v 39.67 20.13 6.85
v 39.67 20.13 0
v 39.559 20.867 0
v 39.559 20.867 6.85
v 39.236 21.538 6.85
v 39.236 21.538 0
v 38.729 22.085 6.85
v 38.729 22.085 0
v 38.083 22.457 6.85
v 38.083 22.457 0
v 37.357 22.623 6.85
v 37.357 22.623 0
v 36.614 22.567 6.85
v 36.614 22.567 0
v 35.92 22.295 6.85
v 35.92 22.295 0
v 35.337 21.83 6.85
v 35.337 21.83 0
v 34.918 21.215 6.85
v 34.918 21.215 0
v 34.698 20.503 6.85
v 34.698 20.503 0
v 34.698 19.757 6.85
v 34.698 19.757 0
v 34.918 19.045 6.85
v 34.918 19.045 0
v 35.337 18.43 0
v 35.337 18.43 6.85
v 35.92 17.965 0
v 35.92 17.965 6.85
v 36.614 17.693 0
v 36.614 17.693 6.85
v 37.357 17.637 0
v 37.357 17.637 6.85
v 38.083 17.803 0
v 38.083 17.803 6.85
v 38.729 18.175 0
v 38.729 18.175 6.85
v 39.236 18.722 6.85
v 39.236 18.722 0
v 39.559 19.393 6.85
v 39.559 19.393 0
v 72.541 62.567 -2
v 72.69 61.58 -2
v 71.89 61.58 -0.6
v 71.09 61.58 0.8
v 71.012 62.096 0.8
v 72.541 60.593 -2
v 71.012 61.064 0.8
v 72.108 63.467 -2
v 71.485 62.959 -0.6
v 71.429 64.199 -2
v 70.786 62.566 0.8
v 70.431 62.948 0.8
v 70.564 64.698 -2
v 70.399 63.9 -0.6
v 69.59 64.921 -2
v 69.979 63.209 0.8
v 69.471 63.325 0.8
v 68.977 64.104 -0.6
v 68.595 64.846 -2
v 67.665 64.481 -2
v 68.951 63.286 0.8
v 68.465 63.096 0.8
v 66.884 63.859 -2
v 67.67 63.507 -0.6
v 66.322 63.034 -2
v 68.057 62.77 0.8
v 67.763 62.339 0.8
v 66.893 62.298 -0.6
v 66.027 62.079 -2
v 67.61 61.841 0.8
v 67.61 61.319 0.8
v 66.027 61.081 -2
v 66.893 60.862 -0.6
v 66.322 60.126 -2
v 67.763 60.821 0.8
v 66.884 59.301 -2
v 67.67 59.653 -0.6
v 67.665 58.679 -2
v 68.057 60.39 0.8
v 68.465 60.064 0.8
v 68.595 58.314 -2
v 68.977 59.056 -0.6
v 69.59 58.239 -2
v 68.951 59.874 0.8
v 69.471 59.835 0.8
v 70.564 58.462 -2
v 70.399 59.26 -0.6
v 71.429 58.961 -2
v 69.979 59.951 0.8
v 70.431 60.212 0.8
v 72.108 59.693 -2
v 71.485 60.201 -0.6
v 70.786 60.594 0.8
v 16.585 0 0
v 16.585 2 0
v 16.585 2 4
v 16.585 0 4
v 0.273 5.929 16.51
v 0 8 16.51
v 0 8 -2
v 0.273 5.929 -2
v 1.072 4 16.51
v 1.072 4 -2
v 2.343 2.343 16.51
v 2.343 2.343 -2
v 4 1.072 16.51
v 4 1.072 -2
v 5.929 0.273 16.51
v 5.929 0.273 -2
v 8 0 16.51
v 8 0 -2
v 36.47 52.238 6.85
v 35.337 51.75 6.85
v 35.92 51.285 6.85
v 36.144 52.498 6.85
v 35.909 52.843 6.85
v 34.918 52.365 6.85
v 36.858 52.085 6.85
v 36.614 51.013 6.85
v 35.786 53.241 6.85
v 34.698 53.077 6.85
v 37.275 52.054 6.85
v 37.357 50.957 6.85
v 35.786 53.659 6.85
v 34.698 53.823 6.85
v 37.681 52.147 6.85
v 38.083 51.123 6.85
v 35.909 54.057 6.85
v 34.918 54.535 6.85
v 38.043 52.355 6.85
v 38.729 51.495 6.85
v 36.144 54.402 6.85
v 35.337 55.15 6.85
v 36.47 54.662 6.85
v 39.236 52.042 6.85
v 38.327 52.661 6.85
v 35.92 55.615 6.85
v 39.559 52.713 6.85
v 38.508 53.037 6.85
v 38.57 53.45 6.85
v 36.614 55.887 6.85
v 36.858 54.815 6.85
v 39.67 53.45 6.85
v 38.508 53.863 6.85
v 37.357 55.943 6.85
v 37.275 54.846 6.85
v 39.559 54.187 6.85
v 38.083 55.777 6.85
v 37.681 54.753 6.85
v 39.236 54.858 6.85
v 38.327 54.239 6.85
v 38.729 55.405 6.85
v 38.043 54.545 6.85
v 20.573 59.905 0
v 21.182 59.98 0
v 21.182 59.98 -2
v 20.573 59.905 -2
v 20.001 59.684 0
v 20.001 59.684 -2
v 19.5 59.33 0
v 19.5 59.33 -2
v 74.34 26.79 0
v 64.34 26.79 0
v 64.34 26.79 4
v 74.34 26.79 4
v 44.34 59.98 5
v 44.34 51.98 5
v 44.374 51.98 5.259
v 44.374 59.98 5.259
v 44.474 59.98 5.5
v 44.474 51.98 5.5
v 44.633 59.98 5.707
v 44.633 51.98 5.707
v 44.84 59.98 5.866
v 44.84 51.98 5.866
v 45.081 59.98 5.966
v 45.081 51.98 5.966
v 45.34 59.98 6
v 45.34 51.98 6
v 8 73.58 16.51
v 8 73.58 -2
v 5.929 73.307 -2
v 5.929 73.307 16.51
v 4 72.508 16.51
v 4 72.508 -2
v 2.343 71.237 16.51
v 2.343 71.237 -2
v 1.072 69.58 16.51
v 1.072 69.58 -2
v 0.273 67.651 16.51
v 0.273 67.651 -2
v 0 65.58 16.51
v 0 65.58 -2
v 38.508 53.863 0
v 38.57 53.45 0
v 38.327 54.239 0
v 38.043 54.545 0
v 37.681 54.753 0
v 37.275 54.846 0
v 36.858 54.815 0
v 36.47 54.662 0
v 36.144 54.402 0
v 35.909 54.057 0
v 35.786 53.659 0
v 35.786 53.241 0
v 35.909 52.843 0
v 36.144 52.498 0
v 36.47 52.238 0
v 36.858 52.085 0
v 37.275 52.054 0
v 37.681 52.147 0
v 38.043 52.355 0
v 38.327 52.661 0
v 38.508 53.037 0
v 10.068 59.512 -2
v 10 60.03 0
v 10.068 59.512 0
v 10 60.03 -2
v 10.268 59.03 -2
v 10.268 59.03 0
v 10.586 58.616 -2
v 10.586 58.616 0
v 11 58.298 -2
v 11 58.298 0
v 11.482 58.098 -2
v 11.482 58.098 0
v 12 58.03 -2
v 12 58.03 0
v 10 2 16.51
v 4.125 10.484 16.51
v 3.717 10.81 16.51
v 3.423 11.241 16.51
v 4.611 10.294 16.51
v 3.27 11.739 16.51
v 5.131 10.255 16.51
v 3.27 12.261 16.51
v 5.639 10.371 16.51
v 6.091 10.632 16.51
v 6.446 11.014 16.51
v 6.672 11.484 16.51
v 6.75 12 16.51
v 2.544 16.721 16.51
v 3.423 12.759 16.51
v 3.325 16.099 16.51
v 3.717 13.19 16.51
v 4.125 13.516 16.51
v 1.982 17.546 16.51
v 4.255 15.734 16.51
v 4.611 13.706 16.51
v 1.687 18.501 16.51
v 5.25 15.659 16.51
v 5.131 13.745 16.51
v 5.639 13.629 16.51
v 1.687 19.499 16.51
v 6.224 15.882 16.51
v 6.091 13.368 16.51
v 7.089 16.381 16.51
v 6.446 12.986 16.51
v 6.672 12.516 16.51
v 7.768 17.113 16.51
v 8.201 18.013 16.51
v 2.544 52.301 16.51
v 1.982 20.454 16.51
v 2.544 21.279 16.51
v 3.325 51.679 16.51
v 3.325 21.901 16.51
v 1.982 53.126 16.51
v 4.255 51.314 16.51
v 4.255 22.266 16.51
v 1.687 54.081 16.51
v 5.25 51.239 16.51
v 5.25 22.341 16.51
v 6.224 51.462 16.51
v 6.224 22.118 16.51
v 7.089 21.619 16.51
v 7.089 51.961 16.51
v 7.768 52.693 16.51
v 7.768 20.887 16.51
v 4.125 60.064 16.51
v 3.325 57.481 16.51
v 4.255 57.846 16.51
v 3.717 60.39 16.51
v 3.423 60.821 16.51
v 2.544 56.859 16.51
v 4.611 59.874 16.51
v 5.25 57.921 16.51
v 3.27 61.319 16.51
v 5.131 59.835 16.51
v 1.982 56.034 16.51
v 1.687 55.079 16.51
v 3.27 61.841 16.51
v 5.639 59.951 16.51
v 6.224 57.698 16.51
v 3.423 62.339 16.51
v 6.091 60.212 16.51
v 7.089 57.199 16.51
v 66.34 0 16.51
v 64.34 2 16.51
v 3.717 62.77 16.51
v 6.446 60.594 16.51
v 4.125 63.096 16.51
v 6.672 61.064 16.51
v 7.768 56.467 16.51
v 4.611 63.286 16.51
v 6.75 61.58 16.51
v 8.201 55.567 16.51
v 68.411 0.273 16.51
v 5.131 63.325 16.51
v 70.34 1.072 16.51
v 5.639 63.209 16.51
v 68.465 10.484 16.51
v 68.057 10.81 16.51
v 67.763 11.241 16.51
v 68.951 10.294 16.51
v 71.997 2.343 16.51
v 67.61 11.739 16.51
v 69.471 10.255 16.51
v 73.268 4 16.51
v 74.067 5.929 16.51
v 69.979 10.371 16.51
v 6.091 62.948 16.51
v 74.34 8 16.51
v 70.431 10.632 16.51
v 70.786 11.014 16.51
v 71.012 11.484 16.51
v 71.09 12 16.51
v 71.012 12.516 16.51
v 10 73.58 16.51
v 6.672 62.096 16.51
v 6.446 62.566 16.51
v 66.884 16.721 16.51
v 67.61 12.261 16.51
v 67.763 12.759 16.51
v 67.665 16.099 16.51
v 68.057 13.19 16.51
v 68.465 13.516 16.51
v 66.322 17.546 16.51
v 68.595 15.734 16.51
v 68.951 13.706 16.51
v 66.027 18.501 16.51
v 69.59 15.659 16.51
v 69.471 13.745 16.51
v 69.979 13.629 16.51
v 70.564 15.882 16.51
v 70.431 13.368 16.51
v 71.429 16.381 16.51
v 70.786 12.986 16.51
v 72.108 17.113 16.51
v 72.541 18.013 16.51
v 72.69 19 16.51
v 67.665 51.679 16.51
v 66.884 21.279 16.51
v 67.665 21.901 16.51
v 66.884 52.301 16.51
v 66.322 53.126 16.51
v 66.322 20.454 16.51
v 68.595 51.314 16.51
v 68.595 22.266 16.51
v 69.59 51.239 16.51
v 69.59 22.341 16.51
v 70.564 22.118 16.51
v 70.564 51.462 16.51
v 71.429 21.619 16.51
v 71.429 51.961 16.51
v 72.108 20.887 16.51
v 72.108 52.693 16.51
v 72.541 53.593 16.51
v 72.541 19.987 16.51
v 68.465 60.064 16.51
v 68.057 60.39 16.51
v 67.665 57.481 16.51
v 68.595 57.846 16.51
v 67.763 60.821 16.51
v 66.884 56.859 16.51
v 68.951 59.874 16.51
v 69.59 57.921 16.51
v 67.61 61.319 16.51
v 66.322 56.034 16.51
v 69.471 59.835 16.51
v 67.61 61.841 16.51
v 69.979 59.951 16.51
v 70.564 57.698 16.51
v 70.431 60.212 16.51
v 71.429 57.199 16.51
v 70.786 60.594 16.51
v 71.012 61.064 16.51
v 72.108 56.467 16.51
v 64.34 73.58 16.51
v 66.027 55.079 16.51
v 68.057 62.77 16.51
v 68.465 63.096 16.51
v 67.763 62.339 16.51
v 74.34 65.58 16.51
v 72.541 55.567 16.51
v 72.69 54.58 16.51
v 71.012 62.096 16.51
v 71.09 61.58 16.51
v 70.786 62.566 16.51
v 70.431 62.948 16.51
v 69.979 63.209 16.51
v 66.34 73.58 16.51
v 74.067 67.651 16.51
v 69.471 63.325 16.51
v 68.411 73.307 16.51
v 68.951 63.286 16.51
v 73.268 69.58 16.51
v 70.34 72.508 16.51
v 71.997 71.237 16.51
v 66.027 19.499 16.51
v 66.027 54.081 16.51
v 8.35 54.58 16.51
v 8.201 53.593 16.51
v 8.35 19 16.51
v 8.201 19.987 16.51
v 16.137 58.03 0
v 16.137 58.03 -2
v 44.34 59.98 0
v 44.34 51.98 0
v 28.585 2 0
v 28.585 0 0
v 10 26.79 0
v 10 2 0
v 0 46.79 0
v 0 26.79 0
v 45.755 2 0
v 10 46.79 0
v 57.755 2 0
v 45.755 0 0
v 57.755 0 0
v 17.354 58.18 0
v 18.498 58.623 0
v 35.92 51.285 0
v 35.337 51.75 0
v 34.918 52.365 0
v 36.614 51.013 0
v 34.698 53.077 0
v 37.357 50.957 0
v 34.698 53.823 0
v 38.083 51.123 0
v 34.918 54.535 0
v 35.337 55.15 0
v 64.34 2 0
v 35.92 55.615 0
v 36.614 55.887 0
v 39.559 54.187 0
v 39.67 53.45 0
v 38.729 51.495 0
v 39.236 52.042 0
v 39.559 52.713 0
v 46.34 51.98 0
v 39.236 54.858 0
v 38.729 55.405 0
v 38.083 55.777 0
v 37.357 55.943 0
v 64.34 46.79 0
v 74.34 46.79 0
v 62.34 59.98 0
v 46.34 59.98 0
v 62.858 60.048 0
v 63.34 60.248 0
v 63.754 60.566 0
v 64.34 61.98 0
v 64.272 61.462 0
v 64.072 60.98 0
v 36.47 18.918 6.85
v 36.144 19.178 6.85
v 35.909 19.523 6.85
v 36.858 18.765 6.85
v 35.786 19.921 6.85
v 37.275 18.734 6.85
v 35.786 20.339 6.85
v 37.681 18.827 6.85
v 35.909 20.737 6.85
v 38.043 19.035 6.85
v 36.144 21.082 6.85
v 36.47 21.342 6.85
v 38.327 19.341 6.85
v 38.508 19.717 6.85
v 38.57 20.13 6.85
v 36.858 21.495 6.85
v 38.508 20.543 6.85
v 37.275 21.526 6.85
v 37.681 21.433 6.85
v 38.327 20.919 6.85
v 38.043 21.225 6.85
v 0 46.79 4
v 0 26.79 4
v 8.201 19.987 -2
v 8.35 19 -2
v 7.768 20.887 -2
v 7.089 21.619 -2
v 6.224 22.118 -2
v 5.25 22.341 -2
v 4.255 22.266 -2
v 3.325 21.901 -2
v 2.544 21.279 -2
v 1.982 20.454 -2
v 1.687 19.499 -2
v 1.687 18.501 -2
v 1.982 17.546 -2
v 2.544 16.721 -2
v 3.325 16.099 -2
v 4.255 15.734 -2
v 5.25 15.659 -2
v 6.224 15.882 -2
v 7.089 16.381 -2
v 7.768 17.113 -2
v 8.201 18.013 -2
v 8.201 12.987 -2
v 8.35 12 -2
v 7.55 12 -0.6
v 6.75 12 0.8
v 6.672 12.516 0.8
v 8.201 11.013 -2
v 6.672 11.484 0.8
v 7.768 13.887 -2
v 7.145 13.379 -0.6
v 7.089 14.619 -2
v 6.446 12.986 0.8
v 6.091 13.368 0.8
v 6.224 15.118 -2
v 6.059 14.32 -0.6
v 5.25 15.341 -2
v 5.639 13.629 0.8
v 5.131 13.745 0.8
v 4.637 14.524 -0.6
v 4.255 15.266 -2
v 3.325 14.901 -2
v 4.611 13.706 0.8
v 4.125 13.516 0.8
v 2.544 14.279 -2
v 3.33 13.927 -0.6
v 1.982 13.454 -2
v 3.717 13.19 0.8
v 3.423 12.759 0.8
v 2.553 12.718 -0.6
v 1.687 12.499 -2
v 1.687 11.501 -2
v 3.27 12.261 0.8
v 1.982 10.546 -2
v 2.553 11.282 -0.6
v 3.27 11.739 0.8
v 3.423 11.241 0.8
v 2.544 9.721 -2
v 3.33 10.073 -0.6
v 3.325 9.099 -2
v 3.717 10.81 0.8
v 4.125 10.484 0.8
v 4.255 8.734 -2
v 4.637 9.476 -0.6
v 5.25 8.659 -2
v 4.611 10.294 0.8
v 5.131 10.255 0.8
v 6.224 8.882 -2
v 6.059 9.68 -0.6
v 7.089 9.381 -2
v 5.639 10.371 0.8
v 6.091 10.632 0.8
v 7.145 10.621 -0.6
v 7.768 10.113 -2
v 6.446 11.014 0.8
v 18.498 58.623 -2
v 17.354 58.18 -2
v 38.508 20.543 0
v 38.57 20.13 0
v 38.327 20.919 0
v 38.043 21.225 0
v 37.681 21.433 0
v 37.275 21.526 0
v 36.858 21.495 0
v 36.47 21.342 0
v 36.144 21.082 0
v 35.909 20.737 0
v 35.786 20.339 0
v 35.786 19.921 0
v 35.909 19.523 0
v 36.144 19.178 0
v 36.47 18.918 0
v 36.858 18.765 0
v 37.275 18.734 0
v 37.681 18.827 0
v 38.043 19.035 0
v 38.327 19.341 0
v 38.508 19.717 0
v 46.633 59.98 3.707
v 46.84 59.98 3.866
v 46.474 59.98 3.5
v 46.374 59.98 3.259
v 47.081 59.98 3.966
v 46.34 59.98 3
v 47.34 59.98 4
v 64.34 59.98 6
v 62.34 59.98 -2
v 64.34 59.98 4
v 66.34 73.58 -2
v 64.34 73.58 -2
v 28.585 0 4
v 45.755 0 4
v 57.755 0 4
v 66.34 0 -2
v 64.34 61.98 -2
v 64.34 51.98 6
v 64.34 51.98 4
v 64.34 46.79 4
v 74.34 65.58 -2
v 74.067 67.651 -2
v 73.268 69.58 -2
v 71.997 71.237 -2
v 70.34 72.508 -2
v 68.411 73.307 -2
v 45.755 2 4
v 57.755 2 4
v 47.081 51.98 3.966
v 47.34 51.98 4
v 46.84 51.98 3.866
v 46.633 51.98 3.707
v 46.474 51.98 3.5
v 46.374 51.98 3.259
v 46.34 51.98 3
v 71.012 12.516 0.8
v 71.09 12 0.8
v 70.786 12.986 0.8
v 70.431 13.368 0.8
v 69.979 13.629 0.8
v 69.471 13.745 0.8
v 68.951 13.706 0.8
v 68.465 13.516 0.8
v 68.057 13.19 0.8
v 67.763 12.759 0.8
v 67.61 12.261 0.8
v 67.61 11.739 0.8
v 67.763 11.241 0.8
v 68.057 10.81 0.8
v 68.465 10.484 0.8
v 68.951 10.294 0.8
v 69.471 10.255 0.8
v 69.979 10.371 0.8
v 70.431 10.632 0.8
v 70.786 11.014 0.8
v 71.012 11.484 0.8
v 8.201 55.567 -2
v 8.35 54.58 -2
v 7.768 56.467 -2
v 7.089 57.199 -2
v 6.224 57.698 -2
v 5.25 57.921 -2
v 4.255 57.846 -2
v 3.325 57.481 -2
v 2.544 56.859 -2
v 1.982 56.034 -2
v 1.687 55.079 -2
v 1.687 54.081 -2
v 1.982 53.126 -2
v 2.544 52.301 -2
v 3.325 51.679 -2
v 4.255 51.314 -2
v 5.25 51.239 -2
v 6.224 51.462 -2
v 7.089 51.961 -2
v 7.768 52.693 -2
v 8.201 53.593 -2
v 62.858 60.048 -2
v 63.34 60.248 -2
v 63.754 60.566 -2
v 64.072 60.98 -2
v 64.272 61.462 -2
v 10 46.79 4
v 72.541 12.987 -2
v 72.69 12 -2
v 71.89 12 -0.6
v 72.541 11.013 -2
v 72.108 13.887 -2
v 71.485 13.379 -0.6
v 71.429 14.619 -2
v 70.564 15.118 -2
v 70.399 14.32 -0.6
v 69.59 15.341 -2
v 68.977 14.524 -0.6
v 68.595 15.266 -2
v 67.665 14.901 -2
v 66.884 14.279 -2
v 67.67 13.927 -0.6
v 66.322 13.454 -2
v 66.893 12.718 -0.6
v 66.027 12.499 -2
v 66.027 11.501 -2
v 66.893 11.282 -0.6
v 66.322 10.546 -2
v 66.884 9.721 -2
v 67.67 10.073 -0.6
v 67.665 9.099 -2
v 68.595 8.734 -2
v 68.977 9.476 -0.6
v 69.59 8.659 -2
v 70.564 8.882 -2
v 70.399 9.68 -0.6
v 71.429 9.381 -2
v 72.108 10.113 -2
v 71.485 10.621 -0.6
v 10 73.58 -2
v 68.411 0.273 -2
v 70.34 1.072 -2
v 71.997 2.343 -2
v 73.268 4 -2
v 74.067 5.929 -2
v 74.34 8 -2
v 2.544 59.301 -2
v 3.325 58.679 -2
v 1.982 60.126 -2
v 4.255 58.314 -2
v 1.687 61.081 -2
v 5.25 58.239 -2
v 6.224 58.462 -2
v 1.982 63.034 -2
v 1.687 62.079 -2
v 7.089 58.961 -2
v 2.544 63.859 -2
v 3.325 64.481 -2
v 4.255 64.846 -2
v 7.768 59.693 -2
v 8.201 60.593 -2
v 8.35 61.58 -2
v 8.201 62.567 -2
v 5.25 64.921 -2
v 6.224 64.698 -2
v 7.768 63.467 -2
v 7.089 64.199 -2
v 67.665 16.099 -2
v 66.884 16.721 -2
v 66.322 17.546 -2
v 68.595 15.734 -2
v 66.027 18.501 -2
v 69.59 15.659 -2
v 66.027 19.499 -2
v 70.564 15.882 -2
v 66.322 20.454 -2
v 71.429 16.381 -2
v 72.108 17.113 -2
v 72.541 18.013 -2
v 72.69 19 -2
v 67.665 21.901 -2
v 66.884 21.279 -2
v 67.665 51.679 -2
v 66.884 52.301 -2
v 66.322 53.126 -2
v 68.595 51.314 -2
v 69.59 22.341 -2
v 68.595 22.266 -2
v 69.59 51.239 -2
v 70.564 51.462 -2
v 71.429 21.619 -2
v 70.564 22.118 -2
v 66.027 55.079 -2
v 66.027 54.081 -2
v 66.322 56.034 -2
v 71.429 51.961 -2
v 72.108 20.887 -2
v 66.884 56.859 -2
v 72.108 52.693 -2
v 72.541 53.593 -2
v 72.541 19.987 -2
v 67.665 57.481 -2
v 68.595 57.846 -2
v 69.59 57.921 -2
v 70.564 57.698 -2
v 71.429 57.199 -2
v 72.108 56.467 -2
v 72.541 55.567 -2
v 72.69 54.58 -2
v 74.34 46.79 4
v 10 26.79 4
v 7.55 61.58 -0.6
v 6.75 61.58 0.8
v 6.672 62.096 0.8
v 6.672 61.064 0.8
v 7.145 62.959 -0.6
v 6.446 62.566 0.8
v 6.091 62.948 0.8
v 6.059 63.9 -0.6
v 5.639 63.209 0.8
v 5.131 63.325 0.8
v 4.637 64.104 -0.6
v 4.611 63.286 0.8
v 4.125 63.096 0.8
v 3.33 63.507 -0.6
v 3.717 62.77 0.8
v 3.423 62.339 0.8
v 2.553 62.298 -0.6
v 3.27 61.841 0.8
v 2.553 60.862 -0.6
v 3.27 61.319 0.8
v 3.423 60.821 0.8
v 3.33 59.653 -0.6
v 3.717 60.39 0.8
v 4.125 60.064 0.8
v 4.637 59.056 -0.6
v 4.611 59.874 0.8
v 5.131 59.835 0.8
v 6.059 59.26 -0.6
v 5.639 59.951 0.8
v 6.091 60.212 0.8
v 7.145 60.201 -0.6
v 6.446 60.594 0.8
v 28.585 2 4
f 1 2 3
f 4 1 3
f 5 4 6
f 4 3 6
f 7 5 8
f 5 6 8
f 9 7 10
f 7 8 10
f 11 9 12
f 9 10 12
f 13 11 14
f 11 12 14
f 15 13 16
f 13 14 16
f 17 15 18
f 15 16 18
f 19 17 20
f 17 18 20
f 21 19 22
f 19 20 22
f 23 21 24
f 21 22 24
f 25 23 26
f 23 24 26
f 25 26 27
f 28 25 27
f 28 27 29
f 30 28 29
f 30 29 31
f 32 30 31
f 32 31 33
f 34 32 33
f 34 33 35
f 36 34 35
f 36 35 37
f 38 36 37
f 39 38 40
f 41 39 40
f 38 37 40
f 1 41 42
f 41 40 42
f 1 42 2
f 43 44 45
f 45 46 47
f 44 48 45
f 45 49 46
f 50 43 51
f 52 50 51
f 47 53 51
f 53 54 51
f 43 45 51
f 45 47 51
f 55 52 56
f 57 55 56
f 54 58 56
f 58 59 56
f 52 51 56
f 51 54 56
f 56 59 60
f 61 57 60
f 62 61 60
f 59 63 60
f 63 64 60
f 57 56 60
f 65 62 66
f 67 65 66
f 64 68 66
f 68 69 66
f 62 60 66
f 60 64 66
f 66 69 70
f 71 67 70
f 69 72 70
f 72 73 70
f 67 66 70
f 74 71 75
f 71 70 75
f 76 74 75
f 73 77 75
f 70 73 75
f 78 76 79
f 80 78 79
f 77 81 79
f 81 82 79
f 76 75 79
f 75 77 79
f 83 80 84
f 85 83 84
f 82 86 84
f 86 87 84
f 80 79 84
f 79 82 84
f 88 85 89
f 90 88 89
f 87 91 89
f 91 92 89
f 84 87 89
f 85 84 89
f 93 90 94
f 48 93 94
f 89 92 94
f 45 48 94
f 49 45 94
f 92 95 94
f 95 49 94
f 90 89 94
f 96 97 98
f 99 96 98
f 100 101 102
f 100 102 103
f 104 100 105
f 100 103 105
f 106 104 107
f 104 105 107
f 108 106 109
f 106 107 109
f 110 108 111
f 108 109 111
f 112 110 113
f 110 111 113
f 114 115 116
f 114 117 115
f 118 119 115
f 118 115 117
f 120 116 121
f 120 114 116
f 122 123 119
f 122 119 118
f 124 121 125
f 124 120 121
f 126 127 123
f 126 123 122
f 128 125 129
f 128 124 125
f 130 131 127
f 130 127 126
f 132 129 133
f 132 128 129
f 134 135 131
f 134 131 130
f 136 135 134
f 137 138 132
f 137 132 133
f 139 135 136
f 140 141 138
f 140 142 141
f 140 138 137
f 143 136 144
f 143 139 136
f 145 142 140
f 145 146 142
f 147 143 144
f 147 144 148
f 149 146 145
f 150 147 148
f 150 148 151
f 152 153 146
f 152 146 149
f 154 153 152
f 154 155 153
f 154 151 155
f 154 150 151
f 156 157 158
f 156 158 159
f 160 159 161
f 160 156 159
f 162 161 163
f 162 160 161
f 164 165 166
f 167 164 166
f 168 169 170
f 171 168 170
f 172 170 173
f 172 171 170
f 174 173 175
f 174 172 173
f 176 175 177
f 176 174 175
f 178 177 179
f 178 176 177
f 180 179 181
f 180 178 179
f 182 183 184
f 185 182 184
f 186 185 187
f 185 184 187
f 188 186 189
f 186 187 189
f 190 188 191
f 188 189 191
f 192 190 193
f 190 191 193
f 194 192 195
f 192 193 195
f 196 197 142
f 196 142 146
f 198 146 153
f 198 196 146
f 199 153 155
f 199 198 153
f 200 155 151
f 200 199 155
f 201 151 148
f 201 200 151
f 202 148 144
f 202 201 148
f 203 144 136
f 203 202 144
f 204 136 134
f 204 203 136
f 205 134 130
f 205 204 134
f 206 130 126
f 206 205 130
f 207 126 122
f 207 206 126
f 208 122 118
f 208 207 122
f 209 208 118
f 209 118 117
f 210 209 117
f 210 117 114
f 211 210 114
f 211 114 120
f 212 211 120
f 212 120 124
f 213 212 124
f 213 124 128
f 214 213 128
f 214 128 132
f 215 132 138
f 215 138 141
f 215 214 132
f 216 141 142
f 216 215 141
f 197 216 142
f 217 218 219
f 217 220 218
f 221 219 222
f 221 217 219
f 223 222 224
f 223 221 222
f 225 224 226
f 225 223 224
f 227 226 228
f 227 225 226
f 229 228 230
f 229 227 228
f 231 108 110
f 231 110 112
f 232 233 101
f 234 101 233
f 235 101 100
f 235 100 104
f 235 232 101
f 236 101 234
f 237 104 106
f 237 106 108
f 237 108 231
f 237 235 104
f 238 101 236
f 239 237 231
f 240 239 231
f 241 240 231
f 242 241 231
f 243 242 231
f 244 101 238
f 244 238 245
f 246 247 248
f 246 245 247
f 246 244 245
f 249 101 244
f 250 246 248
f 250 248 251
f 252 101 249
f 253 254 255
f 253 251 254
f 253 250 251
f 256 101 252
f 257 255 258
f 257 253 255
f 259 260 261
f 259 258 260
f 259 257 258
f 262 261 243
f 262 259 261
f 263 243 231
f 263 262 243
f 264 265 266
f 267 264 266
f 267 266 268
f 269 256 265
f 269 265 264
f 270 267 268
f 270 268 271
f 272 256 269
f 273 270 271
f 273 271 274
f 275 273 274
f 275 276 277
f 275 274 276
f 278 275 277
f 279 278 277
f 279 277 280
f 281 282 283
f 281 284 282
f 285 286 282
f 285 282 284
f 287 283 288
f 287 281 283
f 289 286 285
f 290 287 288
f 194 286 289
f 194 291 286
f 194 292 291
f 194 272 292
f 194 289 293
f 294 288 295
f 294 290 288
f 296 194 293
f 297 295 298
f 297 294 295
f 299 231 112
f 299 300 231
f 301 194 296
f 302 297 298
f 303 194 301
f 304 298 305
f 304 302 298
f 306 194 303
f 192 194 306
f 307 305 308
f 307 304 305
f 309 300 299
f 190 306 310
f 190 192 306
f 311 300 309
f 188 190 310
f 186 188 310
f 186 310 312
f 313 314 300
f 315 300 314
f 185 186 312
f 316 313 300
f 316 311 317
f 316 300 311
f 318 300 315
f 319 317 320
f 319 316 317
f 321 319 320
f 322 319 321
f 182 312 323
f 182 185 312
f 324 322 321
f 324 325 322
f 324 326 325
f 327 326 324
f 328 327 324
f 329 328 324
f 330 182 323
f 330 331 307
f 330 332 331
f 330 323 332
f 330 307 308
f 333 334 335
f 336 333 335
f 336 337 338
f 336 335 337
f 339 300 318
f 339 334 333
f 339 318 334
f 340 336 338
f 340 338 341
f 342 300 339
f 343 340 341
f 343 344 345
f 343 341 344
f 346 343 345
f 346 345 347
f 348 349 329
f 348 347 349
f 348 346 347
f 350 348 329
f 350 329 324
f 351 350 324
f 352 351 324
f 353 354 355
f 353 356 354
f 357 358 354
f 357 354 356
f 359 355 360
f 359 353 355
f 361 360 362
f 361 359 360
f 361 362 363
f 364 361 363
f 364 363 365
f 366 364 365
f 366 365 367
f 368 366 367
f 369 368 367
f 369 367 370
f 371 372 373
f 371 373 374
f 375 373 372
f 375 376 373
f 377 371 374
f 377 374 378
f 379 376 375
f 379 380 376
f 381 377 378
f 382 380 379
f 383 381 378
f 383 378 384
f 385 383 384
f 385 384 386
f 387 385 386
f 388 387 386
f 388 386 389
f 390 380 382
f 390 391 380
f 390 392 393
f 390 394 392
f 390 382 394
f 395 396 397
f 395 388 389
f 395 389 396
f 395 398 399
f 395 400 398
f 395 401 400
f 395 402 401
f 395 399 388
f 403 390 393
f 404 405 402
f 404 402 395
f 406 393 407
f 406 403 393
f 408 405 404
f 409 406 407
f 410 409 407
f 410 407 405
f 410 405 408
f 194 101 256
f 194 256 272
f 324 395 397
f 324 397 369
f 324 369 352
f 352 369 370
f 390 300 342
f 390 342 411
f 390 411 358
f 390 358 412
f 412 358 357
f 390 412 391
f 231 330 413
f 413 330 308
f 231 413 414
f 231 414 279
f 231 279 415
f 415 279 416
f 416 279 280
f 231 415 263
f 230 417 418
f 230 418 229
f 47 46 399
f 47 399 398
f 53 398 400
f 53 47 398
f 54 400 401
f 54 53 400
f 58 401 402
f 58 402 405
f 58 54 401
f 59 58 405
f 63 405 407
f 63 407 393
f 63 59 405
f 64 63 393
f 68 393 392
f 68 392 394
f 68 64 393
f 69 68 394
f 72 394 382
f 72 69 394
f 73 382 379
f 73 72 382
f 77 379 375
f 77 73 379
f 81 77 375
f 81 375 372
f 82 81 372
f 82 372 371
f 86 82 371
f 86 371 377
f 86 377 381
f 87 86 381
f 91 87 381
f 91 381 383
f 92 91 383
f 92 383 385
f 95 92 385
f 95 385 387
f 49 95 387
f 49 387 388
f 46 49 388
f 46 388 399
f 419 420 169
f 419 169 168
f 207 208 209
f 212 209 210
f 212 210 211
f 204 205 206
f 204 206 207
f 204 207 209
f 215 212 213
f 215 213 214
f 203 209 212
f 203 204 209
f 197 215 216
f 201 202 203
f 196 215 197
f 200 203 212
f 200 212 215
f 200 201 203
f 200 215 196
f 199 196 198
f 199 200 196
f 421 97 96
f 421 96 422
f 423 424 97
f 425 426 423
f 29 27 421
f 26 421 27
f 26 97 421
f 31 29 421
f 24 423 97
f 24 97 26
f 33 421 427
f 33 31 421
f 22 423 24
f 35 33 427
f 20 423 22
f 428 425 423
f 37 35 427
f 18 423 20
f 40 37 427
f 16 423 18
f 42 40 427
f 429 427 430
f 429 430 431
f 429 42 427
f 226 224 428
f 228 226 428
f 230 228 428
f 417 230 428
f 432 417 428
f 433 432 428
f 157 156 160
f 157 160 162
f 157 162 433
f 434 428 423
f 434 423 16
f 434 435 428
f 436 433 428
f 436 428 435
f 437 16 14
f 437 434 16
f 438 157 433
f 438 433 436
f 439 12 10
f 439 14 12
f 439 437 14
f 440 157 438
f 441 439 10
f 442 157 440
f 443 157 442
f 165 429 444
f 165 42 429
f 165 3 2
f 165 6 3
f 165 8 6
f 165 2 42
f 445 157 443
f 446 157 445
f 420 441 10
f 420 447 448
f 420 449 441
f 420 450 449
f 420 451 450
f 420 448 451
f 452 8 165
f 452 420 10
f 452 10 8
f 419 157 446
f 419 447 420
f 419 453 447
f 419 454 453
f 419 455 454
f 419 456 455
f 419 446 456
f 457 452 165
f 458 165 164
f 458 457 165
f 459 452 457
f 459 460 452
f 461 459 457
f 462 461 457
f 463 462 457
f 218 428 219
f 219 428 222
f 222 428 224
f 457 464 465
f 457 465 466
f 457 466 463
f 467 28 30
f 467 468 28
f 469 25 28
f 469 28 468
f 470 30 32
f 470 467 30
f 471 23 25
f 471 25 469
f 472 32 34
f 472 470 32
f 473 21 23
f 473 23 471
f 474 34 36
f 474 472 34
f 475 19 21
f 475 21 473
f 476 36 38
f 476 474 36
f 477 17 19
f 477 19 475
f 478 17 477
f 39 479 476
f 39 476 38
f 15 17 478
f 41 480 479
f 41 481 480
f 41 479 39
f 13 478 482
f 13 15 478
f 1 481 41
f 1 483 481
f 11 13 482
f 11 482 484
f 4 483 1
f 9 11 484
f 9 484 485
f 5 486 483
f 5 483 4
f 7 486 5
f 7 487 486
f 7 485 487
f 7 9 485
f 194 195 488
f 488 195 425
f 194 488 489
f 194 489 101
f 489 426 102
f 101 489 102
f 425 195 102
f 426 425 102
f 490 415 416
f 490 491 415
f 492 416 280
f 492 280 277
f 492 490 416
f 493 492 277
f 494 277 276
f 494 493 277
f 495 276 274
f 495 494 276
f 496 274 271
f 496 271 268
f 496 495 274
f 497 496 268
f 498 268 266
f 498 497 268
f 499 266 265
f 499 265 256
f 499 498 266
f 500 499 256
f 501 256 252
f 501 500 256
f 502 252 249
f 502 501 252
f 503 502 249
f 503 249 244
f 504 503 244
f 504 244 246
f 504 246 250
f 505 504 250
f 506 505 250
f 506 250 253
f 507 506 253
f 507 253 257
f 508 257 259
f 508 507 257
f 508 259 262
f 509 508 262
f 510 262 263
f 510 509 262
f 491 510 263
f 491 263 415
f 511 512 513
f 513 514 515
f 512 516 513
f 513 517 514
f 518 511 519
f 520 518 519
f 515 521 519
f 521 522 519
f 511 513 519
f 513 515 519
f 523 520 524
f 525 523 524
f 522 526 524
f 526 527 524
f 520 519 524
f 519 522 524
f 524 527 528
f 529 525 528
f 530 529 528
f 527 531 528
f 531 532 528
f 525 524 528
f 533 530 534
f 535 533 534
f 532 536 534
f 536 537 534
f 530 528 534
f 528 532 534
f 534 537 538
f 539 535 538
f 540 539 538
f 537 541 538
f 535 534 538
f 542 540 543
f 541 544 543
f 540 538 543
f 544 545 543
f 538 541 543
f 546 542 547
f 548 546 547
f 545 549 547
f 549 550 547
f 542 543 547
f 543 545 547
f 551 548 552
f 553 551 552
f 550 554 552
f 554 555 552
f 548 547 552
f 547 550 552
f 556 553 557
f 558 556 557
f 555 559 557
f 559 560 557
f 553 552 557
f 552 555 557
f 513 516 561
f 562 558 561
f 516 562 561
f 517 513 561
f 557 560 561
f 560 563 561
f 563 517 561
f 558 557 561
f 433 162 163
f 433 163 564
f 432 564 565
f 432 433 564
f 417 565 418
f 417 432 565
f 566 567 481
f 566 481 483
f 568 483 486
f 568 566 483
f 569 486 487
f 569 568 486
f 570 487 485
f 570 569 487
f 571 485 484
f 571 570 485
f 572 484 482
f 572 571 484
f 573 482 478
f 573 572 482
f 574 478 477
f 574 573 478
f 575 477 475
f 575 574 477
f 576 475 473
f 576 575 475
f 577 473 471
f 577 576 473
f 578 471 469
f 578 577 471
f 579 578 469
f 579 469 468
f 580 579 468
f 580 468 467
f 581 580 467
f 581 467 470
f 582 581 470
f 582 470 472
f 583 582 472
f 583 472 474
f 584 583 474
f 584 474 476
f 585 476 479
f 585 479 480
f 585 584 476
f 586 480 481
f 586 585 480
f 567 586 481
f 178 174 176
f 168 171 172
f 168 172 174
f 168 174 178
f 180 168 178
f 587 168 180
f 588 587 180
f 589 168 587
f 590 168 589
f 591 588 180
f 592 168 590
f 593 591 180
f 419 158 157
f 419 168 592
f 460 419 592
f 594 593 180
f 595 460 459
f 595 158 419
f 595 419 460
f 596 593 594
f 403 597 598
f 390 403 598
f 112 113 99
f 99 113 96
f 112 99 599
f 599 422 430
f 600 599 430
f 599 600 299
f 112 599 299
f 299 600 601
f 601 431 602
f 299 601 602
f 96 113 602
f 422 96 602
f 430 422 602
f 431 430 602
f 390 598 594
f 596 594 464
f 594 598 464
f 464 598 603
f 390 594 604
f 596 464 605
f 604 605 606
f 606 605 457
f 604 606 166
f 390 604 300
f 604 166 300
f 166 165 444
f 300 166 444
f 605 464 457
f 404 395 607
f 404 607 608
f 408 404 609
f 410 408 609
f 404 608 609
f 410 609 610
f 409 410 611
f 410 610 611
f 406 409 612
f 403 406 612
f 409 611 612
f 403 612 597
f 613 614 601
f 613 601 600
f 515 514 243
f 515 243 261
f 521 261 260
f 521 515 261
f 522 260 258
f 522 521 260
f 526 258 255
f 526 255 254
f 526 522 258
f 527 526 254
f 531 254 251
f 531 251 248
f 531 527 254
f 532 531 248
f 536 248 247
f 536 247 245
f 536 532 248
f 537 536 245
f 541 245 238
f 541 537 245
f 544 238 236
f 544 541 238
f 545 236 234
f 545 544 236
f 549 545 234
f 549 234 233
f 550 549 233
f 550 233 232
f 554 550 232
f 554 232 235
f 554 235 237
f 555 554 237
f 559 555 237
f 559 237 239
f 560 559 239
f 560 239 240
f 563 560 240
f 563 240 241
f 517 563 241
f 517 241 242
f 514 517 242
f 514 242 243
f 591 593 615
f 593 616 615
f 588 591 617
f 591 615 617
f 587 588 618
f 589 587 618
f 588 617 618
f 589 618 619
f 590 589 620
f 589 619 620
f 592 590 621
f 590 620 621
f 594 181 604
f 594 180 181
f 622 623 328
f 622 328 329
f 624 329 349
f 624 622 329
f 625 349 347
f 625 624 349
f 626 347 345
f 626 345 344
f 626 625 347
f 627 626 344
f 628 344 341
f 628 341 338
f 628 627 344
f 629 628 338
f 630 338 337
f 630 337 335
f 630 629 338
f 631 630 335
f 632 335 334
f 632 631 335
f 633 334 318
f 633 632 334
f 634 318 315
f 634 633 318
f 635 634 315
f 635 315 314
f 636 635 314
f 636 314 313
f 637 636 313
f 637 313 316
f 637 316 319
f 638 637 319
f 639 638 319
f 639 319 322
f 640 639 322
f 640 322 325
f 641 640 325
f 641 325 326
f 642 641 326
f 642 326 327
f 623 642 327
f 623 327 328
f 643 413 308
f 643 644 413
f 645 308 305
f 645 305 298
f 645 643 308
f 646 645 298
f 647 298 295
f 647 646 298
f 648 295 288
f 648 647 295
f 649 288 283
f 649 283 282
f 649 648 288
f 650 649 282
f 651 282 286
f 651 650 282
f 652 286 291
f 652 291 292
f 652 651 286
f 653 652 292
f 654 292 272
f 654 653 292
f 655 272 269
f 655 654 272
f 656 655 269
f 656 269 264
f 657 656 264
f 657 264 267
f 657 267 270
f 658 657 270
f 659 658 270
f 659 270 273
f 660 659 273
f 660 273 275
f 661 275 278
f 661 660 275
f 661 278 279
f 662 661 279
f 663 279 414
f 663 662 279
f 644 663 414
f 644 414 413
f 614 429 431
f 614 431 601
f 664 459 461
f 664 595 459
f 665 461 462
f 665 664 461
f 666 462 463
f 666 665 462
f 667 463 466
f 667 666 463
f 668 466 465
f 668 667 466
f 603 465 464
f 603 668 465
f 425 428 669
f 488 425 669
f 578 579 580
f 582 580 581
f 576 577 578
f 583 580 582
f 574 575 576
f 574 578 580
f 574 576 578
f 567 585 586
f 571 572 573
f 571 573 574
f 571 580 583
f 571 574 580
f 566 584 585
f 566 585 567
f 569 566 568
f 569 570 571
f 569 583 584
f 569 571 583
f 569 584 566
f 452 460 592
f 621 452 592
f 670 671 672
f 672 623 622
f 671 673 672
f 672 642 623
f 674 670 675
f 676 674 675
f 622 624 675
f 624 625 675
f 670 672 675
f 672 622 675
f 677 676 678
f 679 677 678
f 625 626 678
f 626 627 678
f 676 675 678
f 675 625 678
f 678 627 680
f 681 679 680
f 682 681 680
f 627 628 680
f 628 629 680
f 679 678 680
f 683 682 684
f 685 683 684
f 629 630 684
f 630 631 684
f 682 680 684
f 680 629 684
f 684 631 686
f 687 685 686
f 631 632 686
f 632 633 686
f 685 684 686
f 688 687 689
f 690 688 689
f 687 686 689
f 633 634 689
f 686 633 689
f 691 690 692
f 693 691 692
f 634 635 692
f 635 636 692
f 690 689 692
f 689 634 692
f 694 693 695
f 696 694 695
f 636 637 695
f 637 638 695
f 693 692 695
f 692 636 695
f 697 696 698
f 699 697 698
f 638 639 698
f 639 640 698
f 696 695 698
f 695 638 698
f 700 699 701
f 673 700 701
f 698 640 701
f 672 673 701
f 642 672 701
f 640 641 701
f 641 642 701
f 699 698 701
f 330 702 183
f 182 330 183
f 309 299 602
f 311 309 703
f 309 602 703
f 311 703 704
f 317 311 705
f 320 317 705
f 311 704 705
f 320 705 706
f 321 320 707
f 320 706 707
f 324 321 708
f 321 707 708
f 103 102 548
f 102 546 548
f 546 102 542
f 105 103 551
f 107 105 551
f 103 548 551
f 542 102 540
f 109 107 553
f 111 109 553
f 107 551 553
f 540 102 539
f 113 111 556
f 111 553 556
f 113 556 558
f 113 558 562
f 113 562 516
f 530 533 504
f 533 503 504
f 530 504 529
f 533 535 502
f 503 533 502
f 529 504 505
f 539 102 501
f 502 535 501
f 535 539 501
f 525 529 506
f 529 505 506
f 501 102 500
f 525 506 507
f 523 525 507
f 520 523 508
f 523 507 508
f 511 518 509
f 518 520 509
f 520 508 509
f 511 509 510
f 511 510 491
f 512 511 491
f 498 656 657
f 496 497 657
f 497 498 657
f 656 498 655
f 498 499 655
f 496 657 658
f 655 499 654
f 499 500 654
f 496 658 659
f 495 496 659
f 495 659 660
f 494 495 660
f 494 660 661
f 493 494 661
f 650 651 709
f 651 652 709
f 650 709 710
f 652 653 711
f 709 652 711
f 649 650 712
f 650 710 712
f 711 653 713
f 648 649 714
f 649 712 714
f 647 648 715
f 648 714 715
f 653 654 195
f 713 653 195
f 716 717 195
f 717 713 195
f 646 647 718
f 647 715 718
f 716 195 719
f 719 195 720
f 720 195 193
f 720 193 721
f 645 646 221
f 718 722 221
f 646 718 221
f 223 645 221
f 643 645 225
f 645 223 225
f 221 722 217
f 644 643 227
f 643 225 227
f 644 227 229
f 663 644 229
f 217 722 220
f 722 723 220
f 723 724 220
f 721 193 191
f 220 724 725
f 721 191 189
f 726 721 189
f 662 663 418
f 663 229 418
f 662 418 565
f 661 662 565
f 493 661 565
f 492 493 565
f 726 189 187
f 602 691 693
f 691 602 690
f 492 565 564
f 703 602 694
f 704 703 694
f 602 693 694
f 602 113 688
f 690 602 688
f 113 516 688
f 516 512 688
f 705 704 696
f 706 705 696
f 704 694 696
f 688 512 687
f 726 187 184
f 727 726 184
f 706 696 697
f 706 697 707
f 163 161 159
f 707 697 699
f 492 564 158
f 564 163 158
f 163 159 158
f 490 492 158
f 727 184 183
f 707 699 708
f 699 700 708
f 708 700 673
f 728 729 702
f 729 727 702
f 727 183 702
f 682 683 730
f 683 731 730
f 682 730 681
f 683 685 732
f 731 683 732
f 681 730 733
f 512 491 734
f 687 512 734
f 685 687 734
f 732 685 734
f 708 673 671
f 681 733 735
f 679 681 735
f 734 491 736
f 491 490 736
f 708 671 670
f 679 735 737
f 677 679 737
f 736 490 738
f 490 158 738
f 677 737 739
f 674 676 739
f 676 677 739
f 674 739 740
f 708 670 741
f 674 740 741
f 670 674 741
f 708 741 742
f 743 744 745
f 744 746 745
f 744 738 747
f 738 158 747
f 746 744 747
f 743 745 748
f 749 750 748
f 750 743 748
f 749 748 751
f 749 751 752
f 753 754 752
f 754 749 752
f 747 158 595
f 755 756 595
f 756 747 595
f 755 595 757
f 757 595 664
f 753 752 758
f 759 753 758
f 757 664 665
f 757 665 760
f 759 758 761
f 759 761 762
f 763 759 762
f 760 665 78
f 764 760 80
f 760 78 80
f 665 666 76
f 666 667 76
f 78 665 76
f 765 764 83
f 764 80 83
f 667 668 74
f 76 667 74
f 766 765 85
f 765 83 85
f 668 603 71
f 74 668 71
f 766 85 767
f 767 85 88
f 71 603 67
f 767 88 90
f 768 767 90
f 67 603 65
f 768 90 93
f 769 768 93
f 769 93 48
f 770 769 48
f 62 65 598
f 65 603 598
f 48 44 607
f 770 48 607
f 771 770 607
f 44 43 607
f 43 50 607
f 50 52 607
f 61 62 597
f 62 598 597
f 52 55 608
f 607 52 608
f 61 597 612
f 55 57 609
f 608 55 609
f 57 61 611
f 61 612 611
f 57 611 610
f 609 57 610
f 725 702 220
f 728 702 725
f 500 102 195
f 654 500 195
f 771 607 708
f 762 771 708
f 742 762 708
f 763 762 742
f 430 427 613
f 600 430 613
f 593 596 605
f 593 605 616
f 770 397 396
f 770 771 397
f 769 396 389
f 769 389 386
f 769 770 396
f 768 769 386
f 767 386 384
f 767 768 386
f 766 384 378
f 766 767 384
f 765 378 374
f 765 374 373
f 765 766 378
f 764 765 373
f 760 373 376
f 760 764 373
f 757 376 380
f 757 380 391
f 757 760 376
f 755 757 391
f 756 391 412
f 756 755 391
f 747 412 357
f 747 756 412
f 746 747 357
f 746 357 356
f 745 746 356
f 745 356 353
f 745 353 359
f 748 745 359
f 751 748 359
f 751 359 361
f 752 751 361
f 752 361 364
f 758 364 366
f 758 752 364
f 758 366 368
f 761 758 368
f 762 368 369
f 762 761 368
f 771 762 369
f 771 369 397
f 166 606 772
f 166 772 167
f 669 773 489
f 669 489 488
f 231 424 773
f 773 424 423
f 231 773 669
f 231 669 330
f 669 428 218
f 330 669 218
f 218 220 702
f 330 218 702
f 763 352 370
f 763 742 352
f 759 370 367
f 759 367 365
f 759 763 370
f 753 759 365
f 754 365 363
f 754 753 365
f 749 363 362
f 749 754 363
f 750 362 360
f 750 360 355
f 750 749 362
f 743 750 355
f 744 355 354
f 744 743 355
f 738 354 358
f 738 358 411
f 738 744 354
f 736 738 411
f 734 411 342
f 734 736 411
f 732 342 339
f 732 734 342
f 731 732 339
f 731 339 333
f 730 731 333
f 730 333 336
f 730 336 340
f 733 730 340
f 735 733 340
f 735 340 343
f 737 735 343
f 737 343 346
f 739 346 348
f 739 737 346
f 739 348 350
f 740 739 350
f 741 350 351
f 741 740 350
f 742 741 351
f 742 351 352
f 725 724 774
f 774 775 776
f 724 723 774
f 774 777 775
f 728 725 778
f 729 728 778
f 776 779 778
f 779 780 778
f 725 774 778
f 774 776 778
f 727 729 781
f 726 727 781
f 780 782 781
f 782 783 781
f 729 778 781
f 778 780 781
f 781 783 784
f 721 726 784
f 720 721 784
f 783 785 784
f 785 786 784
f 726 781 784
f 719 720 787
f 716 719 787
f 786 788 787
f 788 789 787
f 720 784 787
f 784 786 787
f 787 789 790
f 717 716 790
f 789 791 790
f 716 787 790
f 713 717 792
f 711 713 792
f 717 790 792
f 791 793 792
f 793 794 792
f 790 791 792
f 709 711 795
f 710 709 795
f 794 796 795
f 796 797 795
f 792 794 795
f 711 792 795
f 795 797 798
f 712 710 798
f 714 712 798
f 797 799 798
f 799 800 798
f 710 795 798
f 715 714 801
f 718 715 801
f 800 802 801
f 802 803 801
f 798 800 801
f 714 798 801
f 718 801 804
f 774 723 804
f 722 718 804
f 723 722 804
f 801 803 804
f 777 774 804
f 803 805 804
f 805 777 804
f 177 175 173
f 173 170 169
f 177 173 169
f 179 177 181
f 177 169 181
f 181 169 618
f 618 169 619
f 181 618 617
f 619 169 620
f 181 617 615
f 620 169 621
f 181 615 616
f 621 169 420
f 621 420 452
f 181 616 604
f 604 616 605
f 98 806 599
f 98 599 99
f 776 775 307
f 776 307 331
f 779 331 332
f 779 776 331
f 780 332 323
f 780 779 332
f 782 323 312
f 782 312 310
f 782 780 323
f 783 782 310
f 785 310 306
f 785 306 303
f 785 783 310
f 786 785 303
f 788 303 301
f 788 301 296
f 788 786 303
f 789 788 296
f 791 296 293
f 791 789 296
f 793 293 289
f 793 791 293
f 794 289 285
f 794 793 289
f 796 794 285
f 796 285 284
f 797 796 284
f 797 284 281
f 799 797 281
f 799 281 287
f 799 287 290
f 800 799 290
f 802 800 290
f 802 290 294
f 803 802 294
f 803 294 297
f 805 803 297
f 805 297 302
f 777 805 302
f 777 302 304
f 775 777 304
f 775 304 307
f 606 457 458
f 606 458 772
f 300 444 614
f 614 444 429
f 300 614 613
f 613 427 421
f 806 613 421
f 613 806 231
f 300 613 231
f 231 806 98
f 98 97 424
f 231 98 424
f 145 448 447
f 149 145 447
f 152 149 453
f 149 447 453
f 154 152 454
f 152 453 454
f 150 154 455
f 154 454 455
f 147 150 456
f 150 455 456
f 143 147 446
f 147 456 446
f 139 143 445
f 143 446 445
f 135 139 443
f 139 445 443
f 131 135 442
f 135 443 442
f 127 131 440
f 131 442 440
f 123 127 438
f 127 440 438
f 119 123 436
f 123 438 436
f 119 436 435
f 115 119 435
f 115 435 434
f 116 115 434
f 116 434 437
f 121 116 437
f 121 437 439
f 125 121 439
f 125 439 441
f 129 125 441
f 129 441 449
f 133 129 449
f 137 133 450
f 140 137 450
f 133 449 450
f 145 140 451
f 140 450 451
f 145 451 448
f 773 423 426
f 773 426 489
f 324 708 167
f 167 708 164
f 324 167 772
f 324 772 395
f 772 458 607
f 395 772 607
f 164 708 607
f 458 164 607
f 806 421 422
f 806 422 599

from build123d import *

# Parameters (mm, degrees)
F1_R      = 1.75
F1_R_2    = 3.35
F2_DEPTH  = 2
F3_R      = 2
F4_R      = 1.75
F4_R_2    = 3.35
F5_DEPTH  = 16.51
F6_SIZE2  = 2.8
F6_SIZE   = 1.6
F7_R      = 2.5
F7_R_2    = 1.4
F8_DEPTH  = 6.85
F9_W      = 20
F9_H      = 4
F10_DEPTH = 10.001
F11_W     = 20
F11_H     = 4
F12_DEPTH = 10.001
F13_W     = 12
F13_H     = 4
F14_DEPTH = 2.001
F15_W     = 20
F15_H     = 8
F16_DEPTH = 6
F17_W     = 18
F17_H     = 4
F18_DEPTH = 8
F19_R     = 1


with BuildPart() as f2:
    # F1 (on Top) → F2 (new body)
    with BuildSketch(Plane.XY):
        with BuildLine():
            ThreePointArc((8, 73.58), (2.343146, 71.236854), (0, 65.58))
            Line((0, 65.58), (0, 8))
            ThreePointArc((0, 8), (2.343146, 2.343146), (8, 0))
            Line((8, 0), (66.34, 0))
            ThreePointArc((66.34, 0), (71.996854, 2.343146), (74.34, 8))
            Line((74.34, 8), (74.34, 65.58))
            ThreePointArc((74.34, 65.58), (71.996854, 71.236854), (66.34, 73.58))
            Line((66.34, 73.58), (64.34, 73.58))
            Line((64.34, 73.58), (64.34, 59.98))
            Line((64.34, 59.98), (21.181552, 59.98))
            ThreePointArc((21.181552, 59.98), (20.280164, 59.811845), (19.500034, 59.33))
            ThreePointArc((19.500034, 59.33), (17.939776, 58.36631), (16.137, 58.03))
            Line((16.137, 58.03), (10, 58.03))
            Line((10, 58.03), (10, 73.58))
            Line((10, 73.58), (8, 73.58))
        make_face()
        with Locations((5, 12)):
            Circle(F1_R, mode=Mode.SUBTRACT)
        with Locations((5, 19)):
            Circle(F1_R_2, mode=Mode.SUBTRACT)
        with Locations((69.34, 12)):
            Circle(F1_R, mode=Mode.SUBTRACT)
        with Locations((69.34, 19)):
            Circle(F1_R_2, mode=Mode.SUBTRACT)
        with Locations((5, 54.58)):
            Circle(F1_R_2, mode=Mode.SUBTRACT)
        with Locations((5, 61.58)):
            Circle(F1_R, mode=Mode.SUBTRACT)
        with Locations((69.34, 54.58)):
            Circle(F1_R_2, mode=Mode.SUBTRACT)
        with Locations((69.34, 61.58)):
            Circle(F1_R, mode=Mode.SUBTRACT)
    extrude(amount=-F2_DEPTH)

    # F3
    f3_edges = [f2.edges().sort_by_distance(p)[0] for p in [
        (10, 58.03, -1),
        (64.34, 59.98, -1),
    ]]
    fillet(f3_edges, radius=F3_R)

    # F4 (on face) → F5 (join)
    with BuildSketch(Plane.XY):
        with BuildLine():
            ThreePointArc((8, 73.58), (2.343146, 71.236854), (0, 65.58))
            Line((0, 65.58), (0, 8))
            ThreePointArc((0, 8), (2.343146, 2.343146), (8, 0))
            Line((8, 0), (66.34, 0))
            ThreePointArc((66.34, 0), (71.996854, 2.343146), (74.34, 8))
            Line((74.34, 8), (74.34, 65.58))
            ThreePointArc((74.34, 65.58), (71.996854, 71.236854), (66.34, 73.58))
            Line((66.34, 73.58), (64.34, 73.58))
            Line((64.34, 73.58), (64.34, 2))
            Line((64.34, 2), (10, 2))
            Line((10, 2), (10, 73.58))
            Line((10, 73.58), (8, 73.58))
        make_face()
        with Locations((5, 12)):
            Circle(F4_R, mode=Mode.SUBTRACT)
        with Locations((5, 19)):
            Circle(F4_R_2, mode=Mode.SUBTRACT)
        with Locations((69.34, 12)):
            Circle(F4_R, mode=Mode.SUBTRACT)
        with Locations((69.34, 19)):
            Circle(F4_R_2, mode=Mode.SUBTRACT)
        with Locations((5, 54.58)):
            Circle(F4_R_2, mode=Mode.SUBTRACT)
        with Locations((5, 61.58)):
            Circle(F4_R, mode=Mode.SUBTRACT)
        with Locations((69.34, 54.58)):
            Circle(F4_R_2, mode=Mode.SUBTRACT)
        with Locations((69.34, 61.58)):
            Circle(F4_R, mode=Mode.SUBTRACT)
    extrude(amount=F5_DEPTH)

    # F6
    f6_edges = [f2.edges().sort_by_distance(p)[0] for p in [
        (3.25, 61.58, -2),
        (3.25, 12, -2),
        (67.59, 12, -2),
        (67.59, 61.58, -2),
    ]]
    chamfer(f6_edges, length=F6_SIZE, length2=F6_SIZE2)

    # F7 (on face) → F8 (join)
    with BuildSketch(Plane.XY):
        with Locations((37.17, 53.45)):
            Circle(F7_R)
        with Locations((37.17, 53.45)):
            Circle(F7_R_2, mode=Mode.SUBTRACT)
        with Locations((37.17, 20.13)):
            Circle(F7_R)
        with Locations((37.17, 20.13)):
            Circle(F7_R_2, mode=Mode.SUBTRACT)
    extrude(amount=F8_DEPTH)

    # F9 (on face) → F10 (cut, through all)
    with BuildSketch(Plane.YZ.offset(10)):
        with Locations((36.79, 2)):
            Rectangle(F9_W, F9_H)
    extrude(amount=-F10_DEPTH, mode=Mode.SUBTRACT)

    # F11 (on face) → F12 (cut, through all)
    with BuildSketch(Plane(origin=(64.34, 0, 0), x_dir=(0, -1, 0), z_dir=(-1, 0, 0))):
        with Locations((-36.79, 2)):
            Rectangle(F11_W, F11_H)
    extrude(amount=-F12_DEPTH, mode=Mode.SUBTRACT)

    # F13 (on face) → F14 (cut, through all)
    with BuildSketch(Plane(origin=(0, 2, 0), x_dir=(-1, 0, 0), z_dir=(0, 1, 0))):
        with Locations((-51.755, 2)):
            Rectangle(F13_W, F13_H)
        with Locations((-22.585, 2)):
            Rectangle(F13_W, F13_H)
    extrude(amount=-F14_DEPTH, mode=Mode.SUBTRACT)

    # F15 (on face) → F16 (join)
    with BuildSketch(Plane.XY):
        with Locations((54.34, 55.98)):
            Rectangle(F15_W, F15_H)
    extrude(amount=F16_DEPTH)

    # F17 (on face) → F18 (cut, through all)
    with BuildSketch(Plane(origin=(0, 59.98, 0), x_dir=(-1, 0, 0), z_dir=(0, 1, 0))):
        with Locations((-55.34, 2)):
            Rectangle(F17_W, F17_H)
    extrude(amount=-F18_DEPTH, mode=Mode.SUBTRACT)

    # F19
    f19_edges = [f2.edges().sort_by_distance(p)[0] for p in [
        (46.34, 55.98, 4),
        (44.34, 55.98, 6),
    ]]
    fillet(f19_edges, radius=F19_R)


solid = f2.part
